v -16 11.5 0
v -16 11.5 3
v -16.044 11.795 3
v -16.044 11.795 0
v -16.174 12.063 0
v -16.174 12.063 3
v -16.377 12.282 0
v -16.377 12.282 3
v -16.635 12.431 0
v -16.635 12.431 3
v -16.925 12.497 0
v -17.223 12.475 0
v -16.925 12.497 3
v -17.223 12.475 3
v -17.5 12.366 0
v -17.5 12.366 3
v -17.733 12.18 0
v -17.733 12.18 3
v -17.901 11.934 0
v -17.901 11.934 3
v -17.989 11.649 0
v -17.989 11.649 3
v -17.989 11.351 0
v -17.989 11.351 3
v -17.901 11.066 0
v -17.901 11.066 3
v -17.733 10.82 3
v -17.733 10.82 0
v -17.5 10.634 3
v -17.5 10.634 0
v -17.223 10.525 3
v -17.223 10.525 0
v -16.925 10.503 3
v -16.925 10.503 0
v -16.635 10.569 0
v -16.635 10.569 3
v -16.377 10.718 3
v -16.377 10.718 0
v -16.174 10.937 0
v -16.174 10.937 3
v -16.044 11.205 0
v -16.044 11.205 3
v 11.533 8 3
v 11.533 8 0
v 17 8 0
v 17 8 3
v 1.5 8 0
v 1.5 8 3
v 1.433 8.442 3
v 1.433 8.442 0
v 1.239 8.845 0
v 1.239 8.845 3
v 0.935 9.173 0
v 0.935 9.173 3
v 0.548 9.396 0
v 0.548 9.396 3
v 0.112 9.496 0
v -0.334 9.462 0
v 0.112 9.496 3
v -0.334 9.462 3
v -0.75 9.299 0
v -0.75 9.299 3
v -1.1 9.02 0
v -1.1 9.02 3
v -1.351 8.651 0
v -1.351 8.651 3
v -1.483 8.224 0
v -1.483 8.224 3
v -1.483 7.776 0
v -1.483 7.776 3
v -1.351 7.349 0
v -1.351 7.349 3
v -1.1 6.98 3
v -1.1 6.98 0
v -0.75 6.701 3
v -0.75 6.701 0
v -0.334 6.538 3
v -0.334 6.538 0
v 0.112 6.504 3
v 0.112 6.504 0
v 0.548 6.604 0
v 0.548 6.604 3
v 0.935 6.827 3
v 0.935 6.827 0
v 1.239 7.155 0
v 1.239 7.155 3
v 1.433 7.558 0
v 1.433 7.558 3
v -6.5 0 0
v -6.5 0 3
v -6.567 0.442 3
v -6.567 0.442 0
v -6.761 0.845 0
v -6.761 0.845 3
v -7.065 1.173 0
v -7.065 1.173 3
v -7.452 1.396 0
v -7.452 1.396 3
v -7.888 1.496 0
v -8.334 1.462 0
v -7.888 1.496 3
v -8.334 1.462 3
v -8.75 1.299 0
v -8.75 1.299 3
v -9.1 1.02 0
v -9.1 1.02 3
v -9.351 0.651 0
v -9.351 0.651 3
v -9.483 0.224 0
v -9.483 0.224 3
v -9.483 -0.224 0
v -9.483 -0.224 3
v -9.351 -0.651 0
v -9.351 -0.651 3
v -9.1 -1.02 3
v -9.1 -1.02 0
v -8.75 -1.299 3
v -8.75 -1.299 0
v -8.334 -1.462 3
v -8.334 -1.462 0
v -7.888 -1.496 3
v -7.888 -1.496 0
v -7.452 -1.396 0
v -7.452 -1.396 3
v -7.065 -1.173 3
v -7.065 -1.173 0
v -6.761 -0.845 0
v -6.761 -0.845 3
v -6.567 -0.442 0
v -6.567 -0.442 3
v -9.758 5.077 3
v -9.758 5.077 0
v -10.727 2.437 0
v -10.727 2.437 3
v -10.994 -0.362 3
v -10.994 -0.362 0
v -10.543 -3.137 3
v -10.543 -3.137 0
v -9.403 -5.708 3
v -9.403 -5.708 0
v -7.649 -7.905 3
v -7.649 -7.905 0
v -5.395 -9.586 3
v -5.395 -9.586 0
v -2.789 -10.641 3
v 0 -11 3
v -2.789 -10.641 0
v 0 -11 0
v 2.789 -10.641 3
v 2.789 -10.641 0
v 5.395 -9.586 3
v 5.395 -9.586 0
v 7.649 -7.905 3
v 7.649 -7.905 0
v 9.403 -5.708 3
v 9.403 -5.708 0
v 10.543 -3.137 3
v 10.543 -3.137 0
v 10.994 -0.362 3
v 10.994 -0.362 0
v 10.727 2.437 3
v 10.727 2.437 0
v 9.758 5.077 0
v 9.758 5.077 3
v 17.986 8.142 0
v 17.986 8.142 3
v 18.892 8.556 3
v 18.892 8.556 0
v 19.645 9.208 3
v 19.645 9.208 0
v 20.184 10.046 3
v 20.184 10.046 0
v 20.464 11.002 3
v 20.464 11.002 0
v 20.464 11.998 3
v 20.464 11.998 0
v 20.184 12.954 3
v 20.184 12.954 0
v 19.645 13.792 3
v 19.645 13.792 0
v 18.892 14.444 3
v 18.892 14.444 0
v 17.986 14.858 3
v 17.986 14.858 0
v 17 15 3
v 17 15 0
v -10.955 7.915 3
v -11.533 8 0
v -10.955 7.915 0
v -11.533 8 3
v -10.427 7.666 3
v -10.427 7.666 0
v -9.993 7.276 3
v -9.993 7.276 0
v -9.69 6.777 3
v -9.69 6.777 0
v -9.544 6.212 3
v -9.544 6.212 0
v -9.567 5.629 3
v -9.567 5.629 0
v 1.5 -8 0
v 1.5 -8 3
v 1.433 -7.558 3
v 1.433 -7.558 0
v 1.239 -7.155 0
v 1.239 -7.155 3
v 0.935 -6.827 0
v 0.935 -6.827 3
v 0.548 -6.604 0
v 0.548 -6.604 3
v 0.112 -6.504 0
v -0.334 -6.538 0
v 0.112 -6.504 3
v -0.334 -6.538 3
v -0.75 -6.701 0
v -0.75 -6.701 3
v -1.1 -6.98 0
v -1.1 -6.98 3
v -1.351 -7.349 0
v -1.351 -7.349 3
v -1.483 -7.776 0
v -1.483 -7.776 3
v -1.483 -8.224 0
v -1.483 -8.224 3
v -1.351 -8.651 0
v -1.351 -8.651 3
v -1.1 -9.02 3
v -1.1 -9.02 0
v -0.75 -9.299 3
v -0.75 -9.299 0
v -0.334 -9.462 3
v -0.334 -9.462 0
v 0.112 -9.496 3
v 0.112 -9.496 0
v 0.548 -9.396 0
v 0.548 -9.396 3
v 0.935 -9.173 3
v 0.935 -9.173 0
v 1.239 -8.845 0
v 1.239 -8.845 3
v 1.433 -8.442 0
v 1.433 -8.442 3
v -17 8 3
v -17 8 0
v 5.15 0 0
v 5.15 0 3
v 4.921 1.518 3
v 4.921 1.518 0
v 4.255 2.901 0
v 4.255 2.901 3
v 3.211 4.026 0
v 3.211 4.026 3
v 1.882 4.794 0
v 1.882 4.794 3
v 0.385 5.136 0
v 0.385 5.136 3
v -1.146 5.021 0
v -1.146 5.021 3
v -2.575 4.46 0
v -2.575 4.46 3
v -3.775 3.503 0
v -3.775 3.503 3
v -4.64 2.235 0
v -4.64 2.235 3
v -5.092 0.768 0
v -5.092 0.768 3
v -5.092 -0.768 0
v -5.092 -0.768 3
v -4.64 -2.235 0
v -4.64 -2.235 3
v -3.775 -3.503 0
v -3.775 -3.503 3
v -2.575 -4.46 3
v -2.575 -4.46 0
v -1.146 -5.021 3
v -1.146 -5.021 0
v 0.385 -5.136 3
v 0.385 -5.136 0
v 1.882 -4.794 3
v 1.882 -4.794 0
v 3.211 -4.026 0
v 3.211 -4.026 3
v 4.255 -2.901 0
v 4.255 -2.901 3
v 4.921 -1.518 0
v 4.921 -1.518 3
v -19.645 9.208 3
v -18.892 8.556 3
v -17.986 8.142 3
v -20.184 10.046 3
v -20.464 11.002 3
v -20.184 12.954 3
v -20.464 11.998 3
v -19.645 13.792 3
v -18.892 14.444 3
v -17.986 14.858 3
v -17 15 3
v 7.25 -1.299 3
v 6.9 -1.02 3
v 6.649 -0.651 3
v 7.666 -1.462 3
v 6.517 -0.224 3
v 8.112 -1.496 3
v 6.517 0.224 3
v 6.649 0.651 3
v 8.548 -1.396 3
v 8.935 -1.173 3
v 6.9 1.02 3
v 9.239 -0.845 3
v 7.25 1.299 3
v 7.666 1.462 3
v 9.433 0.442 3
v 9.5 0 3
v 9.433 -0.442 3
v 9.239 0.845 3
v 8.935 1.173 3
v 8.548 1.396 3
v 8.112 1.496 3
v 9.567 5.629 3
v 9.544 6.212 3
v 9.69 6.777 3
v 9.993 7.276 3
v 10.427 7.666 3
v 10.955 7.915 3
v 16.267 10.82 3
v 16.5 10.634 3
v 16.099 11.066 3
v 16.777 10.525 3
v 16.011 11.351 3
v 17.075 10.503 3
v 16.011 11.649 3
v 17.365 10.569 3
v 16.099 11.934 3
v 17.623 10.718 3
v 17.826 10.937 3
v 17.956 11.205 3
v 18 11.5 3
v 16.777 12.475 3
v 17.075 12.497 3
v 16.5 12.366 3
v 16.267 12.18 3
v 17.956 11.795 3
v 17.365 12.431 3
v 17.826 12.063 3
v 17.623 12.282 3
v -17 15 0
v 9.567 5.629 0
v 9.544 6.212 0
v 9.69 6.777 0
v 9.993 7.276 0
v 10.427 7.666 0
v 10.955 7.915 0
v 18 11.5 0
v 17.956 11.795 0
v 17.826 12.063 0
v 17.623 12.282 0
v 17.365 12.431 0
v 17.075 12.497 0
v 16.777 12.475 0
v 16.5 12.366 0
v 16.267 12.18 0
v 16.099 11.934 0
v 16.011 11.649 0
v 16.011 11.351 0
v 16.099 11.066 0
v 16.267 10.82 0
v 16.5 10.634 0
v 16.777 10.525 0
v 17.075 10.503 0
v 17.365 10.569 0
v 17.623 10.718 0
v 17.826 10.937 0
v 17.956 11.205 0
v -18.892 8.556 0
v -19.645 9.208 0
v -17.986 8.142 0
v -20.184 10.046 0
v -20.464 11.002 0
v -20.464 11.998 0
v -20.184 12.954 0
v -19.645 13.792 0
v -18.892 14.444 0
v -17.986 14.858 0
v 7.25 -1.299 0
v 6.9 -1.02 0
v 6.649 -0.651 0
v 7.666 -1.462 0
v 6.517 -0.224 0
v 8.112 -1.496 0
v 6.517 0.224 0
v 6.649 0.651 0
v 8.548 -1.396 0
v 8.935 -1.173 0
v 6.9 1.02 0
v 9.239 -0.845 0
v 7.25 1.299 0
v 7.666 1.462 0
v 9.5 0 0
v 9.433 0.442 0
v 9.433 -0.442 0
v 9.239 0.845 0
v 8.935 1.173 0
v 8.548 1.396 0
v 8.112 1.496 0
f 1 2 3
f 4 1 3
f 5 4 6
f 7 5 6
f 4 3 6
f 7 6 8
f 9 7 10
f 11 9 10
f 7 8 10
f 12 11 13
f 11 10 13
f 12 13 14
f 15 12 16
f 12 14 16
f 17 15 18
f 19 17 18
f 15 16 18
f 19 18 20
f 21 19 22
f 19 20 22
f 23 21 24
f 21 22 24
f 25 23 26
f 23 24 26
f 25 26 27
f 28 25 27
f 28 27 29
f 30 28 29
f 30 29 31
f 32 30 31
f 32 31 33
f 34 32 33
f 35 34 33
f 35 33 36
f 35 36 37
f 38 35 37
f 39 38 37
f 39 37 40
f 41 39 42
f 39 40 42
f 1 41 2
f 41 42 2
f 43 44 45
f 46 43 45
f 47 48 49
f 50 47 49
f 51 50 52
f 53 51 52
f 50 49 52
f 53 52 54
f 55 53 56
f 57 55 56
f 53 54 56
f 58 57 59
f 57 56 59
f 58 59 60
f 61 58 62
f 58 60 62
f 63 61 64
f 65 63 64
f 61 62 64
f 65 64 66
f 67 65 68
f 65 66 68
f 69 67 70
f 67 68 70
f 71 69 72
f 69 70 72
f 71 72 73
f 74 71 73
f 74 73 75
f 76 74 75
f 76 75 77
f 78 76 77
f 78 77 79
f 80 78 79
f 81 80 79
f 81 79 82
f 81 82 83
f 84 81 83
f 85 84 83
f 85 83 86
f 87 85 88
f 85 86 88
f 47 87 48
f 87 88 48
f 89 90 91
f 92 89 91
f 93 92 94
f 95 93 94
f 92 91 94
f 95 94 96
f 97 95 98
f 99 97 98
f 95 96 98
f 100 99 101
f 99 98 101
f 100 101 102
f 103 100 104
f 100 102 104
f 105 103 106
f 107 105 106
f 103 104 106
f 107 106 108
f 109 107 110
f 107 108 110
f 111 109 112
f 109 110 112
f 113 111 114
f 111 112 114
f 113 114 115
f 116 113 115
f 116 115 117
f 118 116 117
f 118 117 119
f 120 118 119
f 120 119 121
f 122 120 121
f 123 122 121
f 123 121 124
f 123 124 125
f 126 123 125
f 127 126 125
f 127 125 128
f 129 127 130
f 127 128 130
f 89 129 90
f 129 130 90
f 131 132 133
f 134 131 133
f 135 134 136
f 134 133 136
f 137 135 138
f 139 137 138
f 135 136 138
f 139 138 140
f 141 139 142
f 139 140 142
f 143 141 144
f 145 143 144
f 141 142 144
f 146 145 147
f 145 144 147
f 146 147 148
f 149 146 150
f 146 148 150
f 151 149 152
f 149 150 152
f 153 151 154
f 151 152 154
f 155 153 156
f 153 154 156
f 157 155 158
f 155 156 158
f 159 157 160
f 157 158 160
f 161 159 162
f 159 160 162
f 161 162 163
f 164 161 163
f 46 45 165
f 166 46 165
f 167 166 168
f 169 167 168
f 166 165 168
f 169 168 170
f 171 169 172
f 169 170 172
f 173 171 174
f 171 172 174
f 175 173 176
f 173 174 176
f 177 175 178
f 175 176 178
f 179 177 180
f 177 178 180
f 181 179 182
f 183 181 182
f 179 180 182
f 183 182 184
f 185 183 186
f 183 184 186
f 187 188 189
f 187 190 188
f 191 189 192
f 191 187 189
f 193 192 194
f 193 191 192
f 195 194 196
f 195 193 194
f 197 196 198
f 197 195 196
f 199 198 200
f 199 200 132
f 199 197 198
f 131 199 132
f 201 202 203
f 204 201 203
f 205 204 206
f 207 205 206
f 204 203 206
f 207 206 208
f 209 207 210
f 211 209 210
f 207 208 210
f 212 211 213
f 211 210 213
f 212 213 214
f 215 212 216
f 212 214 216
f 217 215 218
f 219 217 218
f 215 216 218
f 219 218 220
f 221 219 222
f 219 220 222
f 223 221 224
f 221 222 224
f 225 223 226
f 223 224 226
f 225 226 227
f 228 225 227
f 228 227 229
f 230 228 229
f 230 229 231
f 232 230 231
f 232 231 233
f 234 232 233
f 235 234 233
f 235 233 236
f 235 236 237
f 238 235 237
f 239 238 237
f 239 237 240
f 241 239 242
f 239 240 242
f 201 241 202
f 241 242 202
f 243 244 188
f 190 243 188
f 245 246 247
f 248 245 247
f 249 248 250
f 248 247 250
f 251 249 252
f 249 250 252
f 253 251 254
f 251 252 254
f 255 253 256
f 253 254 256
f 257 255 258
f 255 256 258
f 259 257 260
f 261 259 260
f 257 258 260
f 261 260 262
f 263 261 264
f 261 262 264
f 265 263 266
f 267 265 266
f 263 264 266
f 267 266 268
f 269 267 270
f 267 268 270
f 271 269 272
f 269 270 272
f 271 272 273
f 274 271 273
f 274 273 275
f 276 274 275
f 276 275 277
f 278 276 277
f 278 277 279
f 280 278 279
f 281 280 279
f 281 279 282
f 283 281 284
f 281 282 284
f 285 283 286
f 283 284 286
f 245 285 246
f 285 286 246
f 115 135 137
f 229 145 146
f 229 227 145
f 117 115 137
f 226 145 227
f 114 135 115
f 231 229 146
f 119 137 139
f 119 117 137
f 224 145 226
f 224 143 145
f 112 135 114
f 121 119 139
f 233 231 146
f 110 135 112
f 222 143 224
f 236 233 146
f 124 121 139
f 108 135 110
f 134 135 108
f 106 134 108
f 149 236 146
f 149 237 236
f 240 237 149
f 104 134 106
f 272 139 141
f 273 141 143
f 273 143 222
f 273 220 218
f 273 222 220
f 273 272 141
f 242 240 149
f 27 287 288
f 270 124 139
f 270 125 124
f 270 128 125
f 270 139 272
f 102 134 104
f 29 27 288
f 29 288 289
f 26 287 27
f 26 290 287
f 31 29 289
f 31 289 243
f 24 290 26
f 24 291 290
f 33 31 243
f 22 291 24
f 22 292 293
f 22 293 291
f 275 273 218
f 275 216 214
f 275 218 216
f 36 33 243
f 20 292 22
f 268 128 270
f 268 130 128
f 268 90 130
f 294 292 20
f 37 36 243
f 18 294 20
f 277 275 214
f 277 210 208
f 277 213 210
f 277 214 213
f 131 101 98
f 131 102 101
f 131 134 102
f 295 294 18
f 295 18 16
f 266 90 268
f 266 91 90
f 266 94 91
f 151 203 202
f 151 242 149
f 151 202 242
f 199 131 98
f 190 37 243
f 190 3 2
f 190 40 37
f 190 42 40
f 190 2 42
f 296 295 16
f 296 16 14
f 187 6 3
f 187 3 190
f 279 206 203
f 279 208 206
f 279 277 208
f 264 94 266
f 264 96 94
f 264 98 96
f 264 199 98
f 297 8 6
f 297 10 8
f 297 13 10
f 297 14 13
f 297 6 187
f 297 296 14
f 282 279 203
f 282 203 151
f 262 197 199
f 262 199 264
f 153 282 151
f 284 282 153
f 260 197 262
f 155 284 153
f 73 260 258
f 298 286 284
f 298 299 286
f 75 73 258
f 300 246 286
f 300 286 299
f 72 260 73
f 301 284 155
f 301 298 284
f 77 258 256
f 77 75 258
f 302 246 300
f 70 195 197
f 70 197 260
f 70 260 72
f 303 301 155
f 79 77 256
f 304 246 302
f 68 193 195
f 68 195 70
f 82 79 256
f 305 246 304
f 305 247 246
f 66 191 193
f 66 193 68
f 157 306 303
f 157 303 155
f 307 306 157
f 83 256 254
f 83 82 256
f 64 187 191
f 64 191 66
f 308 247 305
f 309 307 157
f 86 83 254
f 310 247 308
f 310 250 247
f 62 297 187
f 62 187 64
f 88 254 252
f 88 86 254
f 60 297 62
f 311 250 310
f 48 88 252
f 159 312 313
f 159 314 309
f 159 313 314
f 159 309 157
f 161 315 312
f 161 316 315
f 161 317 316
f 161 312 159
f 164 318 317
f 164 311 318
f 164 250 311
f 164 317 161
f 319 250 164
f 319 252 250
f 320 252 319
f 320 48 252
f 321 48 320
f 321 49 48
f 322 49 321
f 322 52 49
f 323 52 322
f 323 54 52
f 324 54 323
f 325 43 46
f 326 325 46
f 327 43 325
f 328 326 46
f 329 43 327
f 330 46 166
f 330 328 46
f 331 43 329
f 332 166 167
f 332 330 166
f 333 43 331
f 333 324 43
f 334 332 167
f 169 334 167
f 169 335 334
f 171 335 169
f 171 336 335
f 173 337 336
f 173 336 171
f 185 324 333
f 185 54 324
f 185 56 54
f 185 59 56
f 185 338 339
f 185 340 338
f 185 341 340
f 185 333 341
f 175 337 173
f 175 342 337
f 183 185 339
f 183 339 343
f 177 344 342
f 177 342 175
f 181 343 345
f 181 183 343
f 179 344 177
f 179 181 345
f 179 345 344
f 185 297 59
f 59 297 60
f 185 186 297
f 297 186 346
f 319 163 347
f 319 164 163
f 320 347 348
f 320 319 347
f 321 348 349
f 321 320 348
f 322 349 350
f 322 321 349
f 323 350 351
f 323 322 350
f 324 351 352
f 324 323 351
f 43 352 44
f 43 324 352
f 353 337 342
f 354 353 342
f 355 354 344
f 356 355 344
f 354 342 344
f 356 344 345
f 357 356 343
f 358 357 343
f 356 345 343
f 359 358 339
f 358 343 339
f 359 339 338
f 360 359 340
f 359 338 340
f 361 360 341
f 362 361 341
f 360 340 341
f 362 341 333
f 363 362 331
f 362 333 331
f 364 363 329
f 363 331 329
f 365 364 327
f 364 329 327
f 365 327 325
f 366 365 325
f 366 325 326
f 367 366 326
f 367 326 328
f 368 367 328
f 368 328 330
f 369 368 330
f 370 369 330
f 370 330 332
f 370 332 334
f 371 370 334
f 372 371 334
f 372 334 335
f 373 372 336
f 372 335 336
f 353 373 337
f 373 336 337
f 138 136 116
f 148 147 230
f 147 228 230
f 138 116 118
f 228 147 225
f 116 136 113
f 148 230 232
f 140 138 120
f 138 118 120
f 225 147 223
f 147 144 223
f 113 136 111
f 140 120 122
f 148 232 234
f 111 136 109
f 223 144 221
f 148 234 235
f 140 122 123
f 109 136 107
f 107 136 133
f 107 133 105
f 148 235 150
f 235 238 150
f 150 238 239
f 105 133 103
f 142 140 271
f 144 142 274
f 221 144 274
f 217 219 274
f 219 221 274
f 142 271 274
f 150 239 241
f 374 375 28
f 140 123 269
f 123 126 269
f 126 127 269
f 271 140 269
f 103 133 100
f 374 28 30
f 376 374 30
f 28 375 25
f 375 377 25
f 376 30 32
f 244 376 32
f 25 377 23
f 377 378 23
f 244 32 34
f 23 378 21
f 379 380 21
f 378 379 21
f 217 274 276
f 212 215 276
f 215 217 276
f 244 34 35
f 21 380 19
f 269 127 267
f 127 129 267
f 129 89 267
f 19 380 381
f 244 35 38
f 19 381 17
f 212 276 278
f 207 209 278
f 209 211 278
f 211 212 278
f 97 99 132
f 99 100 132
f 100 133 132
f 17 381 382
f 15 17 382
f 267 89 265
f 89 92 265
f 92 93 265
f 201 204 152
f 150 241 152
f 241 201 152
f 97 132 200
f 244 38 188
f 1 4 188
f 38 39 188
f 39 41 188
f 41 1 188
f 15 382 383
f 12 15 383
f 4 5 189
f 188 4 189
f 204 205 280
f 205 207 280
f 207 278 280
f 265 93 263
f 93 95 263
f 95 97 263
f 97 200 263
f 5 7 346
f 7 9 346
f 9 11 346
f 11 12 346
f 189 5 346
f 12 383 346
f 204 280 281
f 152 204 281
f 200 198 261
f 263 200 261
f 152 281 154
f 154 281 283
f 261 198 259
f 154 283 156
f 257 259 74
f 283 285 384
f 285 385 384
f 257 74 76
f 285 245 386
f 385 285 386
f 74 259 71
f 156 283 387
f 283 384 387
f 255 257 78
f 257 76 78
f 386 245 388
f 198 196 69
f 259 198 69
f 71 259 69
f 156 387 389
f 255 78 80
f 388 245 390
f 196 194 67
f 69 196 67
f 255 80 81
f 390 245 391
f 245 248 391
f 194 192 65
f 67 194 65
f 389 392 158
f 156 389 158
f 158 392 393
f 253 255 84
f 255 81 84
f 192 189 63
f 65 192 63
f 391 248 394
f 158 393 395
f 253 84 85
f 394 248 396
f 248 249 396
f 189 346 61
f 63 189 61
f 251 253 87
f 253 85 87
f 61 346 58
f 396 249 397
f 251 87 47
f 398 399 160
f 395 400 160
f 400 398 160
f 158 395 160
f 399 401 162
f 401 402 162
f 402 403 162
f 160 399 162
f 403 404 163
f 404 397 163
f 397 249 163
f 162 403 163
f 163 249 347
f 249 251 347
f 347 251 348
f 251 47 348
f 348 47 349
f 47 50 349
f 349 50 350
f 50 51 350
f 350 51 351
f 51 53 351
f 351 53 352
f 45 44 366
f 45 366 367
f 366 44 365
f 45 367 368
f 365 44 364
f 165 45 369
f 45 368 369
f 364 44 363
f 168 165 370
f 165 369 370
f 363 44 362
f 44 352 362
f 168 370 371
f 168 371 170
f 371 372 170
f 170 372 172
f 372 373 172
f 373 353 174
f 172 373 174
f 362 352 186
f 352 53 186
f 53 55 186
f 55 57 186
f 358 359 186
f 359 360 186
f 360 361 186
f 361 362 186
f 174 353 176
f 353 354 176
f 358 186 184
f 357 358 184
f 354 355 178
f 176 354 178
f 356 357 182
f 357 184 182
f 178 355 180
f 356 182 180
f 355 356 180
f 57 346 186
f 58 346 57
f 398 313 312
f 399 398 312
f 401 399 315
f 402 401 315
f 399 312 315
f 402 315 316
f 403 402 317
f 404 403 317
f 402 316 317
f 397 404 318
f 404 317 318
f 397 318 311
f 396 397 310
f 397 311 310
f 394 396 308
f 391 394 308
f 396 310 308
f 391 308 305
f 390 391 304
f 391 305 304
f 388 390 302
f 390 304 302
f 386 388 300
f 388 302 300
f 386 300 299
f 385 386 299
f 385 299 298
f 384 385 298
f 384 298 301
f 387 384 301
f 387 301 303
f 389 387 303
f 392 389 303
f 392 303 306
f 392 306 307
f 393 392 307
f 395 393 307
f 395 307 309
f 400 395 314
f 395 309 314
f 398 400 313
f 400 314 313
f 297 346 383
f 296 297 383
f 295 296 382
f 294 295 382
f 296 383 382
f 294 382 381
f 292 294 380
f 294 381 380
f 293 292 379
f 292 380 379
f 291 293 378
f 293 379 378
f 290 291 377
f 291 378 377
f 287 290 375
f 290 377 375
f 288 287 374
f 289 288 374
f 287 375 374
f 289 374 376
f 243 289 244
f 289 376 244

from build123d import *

# Parameters (mm, degrees)
EXTRUDE_1_DEPTH     = 3
SKETCH_2_R          = 5.15
SKETCH_2_R_2        = 1.5
SKETCH_2_R_3        = 1
CUT_EXTRUDE_1_DEPTH = 3
FILLET_1_R          = 2


with BuildPart() as part:
    # 草图1 → 凸台-拉伸1 (new body)
    with BuildSketch(Plane.XY):
        with BuildLine():
            Line((-17, 8), (-7.549834435, 8))
            ThreePointArc((-7.549834435, 8), (0, -11), (7.549834435, 8))
            Line((7.549834435, 8), (17, 8))
            ThreePointArc((17, 8), (20.5, 11.5), (17, 15))
            Line((17, 15), (-17, 15))
            ThreePointArc((-17, 15), (-20.5, 11.5), (-17, 8))
        make_face()
    extrude(amount=EXTRUDE_1_DEPTH)

    # 草图2 → 切除-拉伸1 (cut)
    with BuildSketch(Plane.XY.offset(3)):
        Circle(SKETCH_2_R)
        with Locations((8, 0)):
            Circle(SKETCH_2_R_2)
        with Locations((0, -8)):
            Circle(SKETCH_2_R_2)
        with Locations((-8, 0)):
            Circle(SKETCH_2_R_2)
        with Locations((0, 8)):
            Circle(SKETCH_2_R_2)
        with Locations((-17, 11.5)):
            Circle(SKETCH_2_R_3)
        with Locations((17, 11.5)):
            Circle(SKETCH_2_R_3)
    extrude(amount=-CUT_EXTRUDE_1_DEPTH, mode=Mode.SUBTRACT)

    # 圆角1
    fillet_1_edges = [part.edges().sort_by_distance(p)[0] for p in [
        (-7.549834435, 8, 1.5),
        (7.549834435, 8, 1.5),
    ]]
    fillet(fillet_1_edges, radius=FILLET_1_R)


solid = part.part
